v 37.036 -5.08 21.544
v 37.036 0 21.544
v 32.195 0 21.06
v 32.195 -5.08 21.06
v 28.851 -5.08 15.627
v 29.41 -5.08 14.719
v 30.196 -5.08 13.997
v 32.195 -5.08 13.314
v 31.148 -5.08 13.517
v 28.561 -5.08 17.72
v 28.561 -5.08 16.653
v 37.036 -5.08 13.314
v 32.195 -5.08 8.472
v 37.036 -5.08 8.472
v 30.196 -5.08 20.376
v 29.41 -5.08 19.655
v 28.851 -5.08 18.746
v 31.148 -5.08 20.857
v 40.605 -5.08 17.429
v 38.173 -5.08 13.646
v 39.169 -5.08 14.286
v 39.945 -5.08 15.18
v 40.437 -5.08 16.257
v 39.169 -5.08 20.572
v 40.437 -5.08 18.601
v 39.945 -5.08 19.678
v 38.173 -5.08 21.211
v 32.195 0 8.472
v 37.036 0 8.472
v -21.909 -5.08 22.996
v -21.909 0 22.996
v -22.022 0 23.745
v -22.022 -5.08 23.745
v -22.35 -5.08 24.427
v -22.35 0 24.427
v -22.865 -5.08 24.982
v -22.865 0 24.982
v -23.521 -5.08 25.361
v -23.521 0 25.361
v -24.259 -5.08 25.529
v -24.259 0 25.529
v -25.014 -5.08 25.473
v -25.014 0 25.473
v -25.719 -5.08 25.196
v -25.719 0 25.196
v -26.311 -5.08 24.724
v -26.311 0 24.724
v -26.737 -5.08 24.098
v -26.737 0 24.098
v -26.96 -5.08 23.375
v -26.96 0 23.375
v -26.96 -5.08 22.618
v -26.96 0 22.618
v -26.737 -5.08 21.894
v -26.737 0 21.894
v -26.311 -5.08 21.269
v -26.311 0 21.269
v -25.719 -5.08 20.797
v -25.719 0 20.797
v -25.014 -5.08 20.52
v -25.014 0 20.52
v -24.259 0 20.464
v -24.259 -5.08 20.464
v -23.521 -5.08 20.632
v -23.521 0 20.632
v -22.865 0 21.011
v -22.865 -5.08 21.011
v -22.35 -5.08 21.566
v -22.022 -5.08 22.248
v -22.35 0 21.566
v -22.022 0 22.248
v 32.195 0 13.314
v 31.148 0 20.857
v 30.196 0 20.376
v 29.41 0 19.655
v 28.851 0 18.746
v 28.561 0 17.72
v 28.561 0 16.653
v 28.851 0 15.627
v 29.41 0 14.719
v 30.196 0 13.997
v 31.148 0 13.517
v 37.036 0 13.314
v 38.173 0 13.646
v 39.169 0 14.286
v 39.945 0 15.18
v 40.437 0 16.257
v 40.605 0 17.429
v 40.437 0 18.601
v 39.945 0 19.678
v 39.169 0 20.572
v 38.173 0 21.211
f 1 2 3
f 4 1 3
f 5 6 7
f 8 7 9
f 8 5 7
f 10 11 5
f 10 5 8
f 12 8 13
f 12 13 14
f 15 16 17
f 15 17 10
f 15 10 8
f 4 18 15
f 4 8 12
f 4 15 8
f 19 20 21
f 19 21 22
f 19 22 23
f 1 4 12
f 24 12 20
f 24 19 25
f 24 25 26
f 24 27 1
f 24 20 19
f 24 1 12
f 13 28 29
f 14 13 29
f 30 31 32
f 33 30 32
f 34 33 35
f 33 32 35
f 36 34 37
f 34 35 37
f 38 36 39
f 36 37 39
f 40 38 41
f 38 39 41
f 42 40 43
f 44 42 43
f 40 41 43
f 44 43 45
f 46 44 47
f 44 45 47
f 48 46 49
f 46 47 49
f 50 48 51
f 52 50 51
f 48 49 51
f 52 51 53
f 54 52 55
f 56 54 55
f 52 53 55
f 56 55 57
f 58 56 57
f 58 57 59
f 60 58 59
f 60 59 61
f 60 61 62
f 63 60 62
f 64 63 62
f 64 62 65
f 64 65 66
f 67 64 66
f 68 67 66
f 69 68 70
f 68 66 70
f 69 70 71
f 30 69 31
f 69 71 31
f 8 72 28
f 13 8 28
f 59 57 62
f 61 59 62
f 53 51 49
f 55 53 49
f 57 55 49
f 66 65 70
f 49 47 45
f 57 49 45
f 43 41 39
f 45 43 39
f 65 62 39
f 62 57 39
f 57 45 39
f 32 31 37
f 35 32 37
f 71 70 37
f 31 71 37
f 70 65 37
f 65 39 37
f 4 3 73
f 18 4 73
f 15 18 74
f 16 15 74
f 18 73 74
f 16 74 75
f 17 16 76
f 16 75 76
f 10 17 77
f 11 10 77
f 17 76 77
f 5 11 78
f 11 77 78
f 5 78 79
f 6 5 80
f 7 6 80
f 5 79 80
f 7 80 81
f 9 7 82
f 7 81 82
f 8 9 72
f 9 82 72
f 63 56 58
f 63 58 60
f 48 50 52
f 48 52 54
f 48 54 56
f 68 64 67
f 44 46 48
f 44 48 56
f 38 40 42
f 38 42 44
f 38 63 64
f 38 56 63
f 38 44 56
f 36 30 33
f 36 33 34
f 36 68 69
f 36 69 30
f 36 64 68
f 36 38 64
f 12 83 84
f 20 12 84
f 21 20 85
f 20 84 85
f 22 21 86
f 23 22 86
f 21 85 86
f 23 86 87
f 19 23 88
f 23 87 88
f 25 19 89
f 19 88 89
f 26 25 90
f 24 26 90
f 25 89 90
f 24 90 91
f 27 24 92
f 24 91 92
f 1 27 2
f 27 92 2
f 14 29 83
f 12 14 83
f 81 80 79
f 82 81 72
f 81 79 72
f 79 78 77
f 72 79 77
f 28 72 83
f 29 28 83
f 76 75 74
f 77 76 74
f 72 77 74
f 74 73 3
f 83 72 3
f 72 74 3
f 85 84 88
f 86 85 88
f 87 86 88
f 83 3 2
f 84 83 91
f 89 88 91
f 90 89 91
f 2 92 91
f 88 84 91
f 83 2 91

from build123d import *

# Parameters (mm, degrees)
F0_R     = 2.54
F1_DEPTH = 5.08
F3_DEPTH = 5.08


with BuildPart() as f1:
    # F0 (on Front) → F1 (new body)
    with BuildSketch(Plane.XZ):
        with Locations((-24.448814, 22.996413)):
            Circle(F0_R)
    extrude(amount=F1_DEPTH)


with BuildPart() as f3:
    # F2 (on Front) → F3 (new body)
    with BuildSketch(Plane.XZ):
        with BuildLine():
            Line((37.036318, 8.472365), (37.036318, 13.313714))
            ThreePointArc((37.036318, 13.313714), (40.60537, 17.428861), (37.036318, 21.544008))
            Line((37.036318, 21.544008), (32.194976, 21.059873))
            ThreePointArc((32.194976, 21.059873), (28.523823, 17.186793), (32.194976, 13.313714))
            Line((32.194976, 13.313714), (32.194976, 8.472365))
            Line((32.194976, 8.472365), (37.036318, 8.472365))
        make_face()
    extrude(amount=F3_DEPTH)


solid = Compound([f1.part, f3.part])
